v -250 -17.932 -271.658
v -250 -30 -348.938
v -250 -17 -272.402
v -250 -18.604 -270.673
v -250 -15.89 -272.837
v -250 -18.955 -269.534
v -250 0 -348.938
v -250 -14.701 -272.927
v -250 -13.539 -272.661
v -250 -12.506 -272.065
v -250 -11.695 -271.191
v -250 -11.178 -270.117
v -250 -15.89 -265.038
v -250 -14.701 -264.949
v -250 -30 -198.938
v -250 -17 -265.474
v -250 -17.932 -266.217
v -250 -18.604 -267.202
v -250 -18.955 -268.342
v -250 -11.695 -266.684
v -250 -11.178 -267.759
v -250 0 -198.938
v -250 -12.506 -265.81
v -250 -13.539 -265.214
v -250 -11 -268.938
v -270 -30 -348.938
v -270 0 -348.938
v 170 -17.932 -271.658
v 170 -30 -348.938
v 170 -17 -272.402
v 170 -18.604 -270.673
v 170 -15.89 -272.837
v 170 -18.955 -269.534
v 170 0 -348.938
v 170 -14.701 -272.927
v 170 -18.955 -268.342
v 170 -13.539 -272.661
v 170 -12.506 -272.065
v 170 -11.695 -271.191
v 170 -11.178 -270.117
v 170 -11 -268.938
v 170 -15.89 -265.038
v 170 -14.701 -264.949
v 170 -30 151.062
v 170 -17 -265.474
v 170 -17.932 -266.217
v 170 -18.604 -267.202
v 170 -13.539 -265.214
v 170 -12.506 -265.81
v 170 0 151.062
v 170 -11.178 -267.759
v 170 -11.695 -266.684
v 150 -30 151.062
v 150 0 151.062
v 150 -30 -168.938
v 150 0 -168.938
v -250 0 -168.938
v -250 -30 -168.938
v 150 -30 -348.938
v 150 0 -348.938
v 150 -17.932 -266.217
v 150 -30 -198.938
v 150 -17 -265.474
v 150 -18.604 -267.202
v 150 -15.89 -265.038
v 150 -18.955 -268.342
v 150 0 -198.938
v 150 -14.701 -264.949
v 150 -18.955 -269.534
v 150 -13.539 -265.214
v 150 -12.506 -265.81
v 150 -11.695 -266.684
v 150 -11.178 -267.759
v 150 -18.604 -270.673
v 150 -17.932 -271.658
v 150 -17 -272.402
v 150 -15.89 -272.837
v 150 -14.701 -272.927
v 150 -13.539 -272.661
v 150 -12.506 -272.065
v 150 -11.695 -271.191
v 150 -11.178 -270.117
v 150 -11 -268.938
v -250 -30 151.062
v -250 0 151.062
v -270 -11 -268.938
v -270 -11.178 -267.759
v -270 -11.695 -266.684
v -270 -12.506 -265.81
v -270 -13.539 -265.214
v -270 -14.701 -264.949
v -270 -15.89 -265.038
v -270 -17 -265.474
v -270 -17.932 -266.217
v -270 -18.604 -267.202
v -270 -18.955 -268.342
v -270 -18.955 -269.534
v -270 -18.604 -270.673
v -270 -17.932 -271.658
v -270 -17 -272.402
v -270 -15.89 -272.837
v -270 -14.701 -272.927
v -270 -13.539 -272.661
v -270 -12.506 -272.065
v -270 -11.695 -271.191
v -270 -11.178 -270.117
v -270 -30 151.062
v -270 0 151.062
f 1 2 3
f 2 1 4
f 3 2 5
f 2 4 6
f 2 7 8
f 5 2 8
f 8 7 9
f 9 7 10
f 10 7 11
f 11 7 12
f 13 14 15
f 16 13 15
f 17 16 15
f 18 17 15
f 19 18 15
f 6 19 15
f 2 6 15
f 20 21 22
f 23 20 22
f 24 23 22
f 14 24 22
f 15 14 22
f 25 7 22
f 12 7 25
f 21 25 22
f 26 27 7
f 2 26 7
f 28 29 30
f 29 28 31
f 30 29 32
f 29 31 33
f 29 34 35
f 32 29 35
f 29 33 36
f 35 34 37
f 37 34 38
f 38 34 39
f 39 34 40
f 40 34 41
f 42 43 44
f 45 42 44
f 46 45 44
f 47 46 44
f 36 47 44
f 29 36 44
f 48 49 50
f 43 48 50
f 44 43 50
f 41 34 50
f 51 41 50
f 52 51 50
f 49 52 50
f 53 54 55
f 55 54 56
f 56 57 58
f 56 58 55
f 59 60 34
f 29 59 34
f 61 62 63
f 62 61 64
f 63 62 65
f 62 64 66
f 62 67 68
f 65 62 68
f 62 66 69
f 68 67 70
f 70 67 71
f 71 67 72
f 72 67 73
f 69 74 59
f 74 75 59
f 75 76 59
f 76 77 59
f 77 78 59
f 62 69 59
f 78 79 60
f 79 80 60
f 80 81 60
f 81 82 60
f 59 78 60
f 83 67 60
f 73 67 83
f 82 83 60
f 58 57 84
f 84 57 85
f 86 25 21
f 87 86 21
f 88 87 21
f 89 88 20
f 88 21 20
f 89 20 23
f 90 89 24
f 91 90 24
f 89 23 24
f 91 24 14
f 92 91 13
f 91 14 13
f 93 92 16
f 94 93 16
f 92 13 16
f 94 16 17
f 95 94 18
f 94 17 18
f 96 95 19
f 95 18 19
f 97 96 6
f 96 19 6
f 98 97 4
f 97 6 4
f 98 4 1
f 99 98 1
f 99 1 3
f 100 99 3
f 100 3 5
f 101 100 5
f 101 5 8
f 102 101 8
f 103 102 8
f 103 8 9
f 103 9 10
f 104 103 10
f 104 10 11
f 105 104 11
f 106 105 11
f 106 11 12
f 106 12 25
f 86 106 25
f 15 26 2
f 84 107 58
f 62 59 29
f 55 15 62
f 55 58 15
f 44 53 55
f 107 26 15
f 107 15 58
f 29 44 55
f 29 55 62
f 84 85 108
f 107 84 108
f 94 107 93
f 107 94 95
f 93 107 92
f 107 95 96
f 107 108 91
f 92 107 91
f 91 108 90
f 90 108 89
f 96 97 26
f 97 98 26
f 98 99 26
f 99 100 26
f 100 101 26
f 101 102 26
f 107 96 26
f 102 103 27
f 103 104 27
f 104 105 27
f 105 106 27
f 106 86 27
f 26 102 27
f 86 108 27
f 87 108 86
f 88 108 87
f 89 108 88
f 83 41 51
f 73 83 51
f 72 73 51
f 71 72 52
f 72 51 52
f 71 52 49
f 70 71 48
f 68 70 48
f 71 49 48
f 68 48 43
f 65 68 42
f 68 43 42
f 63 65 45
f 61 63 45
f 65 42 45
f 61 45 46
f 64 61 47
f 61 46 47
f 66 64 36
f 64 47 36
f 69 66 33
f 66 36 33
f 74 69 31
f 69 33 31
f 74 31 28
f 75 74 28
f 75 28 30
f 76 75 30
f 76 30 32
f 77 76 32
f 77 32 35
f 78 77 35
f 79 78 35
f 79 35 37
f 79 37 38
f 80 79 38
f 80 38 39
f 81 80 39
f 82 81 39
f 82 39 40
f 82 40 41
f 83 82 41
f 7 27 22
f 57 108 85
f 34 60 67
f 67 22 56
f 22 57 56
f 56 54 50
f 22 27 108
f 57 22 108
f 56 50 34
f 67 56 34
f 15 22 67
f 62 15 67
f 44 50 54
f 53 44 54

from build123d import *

# Parameters (mm, degrees)
F0_W     = 400
F0_H     = 30
F1_DEPTH = 30
F2_R     = 4
F3_DEPTH = 440.001


with BuildPart() as f1:
    # F0 (on Front) → F1 (new body)
    with BuildSketch(Plane.XZ):
        Polygon((-250, 151.06228), (-270, 151.06228), (-270, -348.93772), (-250, -348.93772), (-250, -198.93772), (-250, -168.93772), align=None)
        with Locations((-50, -183.93772)):
            Rectangle(F0_W, F0_H)
        Polygon((150, 151.06228), (150, -168.93772), (150, -198.93772), (150, -348.93772), (170, -348.93772), (170, 151.06228), align=None)
    extrude(amount=F1_DEPTH)

    # F2 (on face) → F3 (cut, through all)
    with BuildSketch(Plane.YZ.offset(170)):
        with Locations((-15, -268.93772)):
            Circle(F2_R)
    extrude(amount=-F3_DEPTH, mode=Mode.SUBTRACT)


solid = f1.part
